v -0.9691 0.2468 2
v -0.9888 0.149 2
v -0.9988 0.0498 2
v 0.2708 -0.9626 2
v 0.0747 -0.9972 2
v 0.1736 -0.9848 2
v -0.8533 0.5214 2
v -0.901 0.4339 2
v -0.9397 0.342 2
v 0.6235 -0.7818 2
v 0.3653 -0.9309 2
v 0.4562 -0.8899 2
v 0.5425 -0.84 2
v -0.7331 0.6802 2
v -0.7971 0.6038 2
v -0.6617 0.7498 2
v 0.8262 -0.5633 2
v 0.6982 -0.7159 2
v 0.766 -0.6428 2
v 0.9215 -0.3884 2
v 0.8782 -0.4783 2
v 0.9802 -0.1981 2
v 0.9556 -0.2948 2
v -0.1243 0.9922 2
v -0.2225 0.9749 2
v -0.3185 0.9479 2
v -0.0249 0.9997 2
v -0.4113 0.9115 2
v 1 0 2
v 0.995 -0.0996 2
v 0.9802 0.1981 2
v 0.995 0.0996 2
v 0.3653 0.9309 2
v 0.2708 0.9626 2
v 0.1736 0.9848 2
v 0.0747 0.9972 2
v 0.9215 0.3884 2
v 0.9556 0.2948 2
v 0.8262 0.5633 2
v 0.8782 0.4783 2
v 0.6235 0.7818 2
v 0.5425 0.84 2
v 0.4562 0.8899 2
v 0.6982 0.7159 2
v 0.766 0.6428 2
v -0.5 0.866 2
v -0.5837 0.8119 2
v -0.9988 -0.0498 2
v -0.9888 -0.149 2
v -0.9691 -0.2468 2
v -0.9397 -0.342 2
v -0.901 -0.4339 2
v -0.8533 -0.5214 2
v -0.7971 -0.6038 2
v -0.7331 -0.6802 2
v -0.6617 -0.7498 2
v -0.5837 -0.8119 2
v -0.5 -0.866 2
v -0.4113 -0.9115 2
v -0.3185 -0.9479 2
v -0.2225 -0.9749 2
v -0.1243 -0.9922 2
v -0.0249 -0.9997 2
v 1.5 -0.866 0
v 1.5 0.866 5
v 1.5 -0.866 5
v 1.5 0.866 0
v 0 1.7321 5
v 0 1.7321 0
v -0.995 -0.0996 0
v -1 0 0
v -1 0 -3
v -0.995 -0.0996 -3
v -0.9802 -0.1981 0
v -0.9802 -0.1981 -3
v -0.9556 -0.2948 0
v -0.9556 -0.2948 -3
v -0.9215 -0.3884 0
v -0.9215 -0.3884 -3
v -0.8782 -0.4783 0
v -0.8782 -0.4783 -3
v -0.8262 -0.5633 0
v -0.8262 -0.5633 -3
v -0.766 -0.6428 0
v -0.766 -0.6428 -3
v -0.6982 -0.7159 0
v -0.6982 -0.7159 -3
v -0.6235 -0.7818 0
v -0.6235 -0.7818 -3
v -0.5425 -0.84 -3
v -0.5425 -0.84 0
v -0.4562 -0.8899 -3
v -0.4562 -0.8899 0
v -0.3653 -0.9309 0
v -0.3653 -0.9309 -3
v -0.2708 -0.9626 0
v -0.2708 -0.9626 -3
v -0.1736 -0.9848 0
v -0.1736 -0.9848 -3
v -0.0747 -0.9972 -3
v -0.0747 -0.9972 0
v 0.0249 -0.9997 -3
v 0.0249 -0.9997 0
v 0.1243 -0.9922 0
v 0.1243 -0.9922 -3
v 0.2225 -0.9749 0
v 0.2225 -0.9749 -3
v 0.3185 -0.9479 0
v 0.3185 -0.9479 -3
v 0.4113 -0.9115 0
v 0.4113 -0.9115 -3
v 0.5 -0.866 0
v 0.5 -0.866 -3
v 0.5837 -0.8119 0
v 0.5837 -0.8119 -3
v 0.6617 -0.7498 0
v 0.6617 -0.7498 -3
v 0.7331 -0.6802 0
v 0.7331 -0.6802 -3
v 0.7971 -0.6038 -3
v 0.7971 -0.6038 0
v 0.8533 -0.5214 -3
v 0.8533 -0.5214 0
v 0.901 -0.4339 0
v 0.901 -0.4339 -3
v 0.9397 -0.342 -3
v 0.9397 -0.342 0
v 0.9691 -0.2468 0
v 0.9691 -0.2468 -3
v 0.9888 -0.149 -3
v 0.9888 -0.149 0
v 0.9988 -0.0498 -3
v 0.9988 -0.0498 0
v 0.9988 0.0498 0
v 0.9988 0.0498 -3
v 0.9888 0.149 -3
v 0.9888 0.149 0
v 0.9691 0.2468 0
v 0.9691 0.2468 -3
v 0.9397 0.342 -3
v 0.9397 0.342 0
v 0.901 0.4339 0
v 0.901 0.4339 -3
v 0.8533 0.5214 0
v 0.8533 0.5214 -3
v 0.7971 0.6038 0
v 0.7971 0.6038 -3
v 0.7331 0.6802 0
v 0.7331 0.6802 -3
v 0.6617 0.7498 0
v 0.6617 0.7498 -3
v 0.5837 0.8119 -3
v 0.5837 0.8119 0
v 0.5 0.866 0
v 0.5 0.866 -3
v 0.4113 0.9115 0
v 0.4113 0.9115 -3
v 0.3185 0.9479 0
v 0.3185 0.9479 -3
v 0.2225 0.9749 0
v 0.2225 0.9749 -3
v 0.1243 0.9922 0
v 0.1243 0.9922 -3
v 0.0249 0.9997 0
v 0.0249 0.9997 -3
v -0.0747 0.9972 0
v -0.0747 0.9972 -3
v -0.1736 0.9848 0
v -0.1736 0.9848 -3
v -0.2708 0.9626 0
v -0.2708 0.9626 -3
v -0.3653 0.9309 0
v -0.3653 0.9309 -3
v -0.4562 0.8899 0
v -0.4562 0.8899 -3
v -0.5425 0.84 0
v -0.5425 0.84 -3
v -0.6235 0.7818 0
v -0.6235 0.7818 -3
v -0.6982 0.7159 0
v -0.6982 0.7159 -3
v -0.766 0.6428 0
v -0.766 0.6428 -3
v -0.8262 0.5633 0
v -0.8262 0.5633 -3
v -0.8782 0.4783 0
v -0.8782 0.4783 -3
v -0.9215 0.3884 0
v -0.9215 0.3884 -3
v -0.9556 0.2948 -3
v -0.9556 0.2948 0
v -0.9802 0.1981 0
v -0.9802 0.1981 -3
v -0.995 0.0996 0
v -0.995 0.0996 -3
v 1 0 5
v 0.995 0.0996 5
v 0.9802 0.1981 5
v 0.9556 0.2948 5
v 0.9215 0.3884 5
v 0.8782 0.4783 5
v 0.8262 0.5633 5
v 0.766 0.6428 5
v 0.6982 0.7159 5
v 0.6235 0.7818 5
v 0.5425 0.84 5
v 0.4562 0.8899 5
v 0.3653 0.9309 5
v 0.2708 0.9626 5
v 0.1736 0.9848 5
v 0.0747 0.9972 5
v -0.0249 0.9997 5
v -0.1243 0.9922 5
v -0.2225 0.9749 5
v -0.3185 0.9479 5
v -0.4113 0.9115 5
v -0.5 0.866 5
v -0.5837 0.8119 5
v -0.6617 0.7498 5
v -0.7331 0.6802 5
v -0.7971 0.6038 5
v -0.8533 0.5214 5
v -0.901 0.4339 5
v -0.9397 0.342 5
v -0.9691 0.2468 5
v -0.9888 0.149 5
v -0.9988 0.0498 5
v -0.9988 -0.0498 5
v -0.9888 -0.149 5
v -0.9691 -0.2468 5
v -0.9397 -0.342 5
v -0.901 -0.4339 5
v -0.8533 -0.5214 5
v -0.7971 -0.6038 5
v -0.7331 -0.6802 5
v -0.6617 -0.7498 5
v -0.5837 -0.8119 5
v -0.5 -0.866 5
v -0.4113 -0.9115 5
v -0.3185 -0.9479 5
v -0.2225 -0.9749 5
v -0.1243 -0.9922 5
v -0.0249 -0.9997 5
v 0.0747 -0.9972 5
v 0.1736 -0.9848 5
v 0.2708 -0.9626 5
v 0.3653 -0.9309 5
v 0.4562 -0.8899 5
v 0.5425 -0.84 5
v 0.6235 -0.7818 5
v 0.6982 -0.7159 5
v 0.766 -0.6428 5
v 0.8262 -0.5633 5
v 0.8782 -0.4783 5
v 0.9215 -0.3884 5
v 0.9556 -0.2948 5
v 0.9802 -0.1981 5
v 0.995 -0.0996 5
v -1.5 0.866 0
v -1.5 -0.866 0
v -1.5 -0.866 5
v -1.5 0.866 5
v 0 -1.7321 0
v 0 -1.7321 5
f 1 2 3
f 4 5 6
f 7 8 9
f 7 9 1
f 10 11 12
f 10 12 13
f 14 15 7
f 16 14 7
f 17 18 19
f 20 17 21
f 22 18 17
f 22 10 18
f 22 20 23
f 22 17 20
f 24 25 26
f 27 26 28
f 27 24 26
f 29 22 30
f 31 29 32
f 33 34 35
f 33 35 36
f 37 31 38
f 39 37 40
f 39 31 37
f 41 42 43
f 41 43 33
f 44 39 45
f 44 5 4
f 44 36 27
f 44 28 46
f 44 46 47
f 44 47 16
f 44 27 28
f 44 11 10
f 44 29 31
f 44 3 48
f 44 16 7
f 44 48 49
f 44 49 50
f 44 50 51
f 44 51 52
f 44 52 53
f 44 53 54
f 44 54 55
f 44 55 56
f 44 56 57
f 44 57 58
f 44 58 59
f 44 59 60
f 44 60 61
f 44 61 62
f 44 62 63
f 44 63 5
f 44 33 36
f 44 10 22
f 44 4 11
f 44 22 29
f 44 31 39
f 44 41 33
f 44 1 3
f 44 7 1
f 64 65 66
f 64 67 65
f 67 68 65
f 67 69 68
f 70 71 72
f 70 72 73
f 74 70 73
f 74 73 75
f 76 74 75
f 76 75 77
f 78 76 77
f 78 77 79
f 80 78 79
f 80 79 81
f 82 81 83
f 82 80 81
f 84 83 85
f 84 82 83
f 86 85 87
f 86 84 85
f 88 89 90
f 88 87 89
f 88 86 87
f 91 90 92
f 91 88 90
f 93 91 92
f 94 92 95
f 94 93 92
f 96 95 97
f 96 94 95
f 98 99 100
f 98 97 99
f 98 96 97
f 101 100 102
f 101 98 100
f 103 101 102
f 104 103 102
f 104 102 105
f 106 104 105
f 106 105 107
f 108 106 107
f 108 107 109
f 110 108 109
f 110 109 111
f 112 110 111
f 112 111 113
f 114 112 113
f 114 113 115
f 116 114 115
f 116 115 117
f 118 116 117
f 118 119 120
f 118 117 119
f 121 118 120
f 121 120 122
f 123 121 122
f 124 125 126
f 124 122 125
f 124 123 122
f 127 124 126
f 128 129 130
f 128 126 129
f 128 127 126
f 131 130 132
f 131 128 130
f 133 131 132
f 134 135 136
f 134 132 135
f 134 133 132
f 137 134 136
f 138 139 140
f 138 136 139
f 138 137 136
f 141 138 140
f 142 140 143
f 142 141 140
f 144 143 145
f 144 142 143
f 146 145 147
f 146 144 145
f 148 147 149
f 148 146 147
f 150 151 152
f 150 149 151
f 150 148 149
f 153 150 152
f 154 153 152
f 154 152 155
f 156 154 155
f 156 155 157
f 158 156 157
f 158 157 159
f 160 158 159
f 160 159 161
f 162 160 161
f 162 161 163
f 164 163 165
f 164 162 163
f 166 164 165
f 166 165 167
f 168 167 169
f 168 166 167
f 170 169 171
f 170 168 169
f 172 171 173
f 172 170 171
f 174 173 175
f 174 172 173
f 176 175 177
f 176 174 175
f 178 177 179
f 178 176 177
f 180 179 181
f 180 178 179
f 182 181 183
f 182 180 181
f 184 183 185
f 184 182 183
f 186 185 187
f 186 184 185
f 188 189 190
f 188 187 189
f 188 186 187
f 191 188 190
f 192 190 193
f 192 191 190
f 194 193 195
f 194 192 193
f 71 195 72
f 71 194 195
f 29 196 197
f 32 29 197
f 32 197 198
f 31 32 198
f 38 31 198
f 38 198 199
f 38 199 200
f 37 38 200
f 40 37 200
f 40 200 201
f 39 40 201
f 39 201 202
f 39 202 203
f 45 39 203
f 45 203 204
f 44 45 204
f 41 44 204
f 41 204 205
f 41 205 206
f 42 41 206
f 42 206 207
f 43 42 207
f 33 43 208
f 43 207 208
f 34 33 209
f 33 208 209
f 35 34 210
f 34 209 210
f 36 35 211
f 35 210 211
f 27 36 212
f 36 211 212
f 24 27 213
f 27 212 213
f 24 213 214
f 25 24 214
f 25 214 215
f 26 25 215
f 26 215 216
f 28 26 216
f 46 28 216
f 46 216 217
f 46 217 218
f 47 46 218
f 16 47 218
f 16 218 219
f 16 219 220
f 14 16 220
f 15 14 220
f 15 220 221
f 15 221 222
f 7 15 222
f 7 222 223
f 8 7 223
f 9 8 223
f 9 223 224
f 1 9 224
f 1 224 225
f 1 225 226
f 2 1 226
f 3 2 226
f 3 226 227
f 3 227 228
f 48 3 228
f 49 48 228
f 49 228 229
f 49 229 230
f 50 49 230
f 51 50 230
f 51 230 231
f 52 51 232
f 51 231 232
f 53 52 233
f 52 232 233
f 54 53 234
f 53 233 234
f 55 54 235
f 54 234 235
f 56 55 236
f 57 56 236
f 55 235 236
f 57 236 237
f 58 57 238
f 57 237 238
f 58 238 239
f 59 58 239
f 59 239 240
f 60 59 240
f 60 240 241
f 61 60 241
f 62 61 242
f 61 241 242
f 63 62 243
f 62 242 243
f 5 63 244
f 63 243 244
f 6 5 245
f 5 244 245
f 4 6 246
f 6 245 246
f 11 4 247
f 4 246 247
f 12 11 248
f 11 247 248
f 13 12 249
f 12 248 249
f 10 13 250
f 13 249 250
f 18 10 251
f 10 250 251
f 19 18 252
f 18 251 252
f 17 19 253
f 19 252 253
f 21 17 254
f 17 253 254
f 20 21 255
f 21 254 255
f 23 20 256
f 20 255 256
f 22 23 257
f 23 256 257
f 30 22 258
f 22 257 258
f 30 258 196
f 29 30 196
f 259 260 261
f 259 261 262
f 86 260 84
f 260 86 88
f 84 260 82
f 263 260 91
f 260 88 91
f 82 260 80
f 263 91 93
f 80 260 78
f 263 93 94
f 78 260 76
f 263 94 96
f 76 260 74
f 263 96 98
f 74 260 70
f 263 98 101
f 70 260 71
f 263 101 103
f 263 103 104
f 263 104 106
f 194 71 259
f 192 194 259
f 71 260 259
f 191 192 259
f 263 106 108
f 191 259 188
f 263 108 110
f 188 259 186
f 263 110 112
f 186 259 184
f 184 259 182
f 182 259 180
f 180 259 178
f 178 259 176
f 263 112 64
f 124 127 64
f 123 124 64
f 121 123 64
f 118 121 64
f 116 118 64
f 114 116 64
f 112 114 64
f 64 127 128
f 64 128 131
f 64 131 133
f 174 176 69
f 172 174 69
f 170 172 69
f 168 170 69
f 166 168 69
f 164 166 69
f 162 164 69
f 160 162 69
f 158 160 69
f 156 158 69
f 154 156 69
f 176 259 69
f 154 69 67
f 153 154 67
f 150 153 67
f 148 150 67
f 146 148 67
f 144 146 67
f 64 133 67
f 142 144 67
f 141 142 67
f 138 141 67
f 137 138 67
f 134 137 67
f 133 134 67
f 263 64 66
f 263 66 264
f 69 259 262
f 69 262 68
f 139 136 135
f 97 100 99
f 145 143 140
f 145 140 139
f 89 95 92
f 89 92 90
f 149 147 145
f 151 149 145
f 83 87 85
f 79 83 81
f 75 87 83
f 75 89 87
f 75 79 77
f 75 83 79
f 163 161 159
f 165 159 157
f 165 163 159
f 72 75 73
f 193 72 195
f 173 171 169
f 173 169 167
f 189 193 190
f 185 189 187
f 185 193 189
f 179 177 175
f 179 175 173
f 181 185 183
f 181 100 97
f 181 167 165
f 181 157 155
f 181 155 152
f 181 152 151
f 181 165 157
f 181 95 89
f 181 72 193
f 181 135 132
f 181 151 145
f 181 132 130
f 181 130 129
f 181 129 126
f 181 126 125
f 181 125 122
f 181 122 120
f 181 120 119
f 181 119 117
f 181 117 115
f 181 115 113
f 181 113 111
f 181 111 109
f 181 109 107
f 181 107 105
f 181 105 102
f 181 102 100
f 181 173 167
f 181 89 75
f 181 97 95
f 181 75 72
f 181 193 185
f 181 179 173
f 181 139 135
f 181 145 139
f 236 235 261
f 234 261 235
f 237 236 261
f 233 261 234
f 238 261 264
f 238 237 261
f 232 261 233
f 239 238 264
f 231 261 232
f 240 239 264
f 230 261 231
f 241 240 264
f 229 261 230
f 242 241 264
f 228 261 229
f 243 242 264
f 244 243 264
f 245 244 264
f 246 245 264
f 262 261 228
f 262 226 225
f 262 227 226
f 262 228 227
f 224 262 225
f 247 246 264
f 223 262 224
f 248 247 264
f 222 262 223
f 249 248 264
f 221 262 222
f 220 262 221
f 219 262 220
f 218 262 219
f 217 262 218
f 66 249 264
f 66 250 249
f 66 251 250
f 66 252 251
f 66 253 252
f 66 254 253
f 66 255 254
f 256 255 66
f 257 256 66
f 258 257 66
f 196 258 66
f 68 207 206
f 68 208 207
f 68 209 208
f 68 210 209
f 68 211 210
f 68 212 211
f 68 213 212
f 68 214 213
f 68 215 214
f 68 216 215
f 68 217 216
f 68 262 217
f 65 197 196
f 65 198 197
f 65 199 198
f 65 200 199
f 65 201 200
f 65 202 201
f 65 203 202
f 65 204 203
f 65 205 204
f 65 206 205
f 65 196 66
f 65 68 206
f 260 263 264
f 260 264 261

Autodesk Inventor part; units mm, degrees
ref_plane "YZ Plane" through (0, 0, 0) normal (1, 0, 0) x (0, 1, 0)
ref_plane "XZ Plane" through (0, 0, 0) normal (0, 1, 0) x (-1, 0, 0)
ref_plane "XY Plane" through (0, 0, 0) normal (0, 0, 1) x (1, 0, 0)
sketch "Sketch1" plane through (0, 0, 0) normal (0, 0, 1) x (1, 0, 0)
  line L0 (0, 1.7321) -> (1.5, 0.866)
  line L1 (1.5, 0.866) -> (1.5, -0.866)
  line L2 (1.5, -0.866) -> (0, -1.7321)
  line L3 (0, -1.7321) -> (-1.5, -0.866)
  line L4 (-1.5, -0.866) -> (-1.5, 0.866)
  line L5 (-1.5, 0.866) -> (0, 1.7321)
  point P0 (0, 0)
  point P1 (0, 0)
  dimension "d0" = 3
extrude "Extrusion1" add sketch "Sketch1" along normal blind 5
sketch "Sketch2" plane through (0, 0, 5) normal (0, 0, 1) x (1, 0, 0)
  circle A0 centre (0, 0) radius 1
  dimension "d3" = 2
extrude "Extrusion2" cut sketch "Sketch2" against normal blind 3
sketch "Sketch3" plane through (0, 0, 0) normal (0, 0, -1) x (-1, 0, 0)
  circle A0 centre (0, 0) radius 1
extrude "Extrusion3" add sketch "Sketch3" along normal blind 3
thread "Thread1" size "M2x0.4" class "6g" standard "ANSI Metric M Profile" length 12.7
thread "Thread2" size "M2x0.4" class "6H" standard "ANSI Metric M Profile" length 12.7
properties part number "M2_5mm_standoff"
